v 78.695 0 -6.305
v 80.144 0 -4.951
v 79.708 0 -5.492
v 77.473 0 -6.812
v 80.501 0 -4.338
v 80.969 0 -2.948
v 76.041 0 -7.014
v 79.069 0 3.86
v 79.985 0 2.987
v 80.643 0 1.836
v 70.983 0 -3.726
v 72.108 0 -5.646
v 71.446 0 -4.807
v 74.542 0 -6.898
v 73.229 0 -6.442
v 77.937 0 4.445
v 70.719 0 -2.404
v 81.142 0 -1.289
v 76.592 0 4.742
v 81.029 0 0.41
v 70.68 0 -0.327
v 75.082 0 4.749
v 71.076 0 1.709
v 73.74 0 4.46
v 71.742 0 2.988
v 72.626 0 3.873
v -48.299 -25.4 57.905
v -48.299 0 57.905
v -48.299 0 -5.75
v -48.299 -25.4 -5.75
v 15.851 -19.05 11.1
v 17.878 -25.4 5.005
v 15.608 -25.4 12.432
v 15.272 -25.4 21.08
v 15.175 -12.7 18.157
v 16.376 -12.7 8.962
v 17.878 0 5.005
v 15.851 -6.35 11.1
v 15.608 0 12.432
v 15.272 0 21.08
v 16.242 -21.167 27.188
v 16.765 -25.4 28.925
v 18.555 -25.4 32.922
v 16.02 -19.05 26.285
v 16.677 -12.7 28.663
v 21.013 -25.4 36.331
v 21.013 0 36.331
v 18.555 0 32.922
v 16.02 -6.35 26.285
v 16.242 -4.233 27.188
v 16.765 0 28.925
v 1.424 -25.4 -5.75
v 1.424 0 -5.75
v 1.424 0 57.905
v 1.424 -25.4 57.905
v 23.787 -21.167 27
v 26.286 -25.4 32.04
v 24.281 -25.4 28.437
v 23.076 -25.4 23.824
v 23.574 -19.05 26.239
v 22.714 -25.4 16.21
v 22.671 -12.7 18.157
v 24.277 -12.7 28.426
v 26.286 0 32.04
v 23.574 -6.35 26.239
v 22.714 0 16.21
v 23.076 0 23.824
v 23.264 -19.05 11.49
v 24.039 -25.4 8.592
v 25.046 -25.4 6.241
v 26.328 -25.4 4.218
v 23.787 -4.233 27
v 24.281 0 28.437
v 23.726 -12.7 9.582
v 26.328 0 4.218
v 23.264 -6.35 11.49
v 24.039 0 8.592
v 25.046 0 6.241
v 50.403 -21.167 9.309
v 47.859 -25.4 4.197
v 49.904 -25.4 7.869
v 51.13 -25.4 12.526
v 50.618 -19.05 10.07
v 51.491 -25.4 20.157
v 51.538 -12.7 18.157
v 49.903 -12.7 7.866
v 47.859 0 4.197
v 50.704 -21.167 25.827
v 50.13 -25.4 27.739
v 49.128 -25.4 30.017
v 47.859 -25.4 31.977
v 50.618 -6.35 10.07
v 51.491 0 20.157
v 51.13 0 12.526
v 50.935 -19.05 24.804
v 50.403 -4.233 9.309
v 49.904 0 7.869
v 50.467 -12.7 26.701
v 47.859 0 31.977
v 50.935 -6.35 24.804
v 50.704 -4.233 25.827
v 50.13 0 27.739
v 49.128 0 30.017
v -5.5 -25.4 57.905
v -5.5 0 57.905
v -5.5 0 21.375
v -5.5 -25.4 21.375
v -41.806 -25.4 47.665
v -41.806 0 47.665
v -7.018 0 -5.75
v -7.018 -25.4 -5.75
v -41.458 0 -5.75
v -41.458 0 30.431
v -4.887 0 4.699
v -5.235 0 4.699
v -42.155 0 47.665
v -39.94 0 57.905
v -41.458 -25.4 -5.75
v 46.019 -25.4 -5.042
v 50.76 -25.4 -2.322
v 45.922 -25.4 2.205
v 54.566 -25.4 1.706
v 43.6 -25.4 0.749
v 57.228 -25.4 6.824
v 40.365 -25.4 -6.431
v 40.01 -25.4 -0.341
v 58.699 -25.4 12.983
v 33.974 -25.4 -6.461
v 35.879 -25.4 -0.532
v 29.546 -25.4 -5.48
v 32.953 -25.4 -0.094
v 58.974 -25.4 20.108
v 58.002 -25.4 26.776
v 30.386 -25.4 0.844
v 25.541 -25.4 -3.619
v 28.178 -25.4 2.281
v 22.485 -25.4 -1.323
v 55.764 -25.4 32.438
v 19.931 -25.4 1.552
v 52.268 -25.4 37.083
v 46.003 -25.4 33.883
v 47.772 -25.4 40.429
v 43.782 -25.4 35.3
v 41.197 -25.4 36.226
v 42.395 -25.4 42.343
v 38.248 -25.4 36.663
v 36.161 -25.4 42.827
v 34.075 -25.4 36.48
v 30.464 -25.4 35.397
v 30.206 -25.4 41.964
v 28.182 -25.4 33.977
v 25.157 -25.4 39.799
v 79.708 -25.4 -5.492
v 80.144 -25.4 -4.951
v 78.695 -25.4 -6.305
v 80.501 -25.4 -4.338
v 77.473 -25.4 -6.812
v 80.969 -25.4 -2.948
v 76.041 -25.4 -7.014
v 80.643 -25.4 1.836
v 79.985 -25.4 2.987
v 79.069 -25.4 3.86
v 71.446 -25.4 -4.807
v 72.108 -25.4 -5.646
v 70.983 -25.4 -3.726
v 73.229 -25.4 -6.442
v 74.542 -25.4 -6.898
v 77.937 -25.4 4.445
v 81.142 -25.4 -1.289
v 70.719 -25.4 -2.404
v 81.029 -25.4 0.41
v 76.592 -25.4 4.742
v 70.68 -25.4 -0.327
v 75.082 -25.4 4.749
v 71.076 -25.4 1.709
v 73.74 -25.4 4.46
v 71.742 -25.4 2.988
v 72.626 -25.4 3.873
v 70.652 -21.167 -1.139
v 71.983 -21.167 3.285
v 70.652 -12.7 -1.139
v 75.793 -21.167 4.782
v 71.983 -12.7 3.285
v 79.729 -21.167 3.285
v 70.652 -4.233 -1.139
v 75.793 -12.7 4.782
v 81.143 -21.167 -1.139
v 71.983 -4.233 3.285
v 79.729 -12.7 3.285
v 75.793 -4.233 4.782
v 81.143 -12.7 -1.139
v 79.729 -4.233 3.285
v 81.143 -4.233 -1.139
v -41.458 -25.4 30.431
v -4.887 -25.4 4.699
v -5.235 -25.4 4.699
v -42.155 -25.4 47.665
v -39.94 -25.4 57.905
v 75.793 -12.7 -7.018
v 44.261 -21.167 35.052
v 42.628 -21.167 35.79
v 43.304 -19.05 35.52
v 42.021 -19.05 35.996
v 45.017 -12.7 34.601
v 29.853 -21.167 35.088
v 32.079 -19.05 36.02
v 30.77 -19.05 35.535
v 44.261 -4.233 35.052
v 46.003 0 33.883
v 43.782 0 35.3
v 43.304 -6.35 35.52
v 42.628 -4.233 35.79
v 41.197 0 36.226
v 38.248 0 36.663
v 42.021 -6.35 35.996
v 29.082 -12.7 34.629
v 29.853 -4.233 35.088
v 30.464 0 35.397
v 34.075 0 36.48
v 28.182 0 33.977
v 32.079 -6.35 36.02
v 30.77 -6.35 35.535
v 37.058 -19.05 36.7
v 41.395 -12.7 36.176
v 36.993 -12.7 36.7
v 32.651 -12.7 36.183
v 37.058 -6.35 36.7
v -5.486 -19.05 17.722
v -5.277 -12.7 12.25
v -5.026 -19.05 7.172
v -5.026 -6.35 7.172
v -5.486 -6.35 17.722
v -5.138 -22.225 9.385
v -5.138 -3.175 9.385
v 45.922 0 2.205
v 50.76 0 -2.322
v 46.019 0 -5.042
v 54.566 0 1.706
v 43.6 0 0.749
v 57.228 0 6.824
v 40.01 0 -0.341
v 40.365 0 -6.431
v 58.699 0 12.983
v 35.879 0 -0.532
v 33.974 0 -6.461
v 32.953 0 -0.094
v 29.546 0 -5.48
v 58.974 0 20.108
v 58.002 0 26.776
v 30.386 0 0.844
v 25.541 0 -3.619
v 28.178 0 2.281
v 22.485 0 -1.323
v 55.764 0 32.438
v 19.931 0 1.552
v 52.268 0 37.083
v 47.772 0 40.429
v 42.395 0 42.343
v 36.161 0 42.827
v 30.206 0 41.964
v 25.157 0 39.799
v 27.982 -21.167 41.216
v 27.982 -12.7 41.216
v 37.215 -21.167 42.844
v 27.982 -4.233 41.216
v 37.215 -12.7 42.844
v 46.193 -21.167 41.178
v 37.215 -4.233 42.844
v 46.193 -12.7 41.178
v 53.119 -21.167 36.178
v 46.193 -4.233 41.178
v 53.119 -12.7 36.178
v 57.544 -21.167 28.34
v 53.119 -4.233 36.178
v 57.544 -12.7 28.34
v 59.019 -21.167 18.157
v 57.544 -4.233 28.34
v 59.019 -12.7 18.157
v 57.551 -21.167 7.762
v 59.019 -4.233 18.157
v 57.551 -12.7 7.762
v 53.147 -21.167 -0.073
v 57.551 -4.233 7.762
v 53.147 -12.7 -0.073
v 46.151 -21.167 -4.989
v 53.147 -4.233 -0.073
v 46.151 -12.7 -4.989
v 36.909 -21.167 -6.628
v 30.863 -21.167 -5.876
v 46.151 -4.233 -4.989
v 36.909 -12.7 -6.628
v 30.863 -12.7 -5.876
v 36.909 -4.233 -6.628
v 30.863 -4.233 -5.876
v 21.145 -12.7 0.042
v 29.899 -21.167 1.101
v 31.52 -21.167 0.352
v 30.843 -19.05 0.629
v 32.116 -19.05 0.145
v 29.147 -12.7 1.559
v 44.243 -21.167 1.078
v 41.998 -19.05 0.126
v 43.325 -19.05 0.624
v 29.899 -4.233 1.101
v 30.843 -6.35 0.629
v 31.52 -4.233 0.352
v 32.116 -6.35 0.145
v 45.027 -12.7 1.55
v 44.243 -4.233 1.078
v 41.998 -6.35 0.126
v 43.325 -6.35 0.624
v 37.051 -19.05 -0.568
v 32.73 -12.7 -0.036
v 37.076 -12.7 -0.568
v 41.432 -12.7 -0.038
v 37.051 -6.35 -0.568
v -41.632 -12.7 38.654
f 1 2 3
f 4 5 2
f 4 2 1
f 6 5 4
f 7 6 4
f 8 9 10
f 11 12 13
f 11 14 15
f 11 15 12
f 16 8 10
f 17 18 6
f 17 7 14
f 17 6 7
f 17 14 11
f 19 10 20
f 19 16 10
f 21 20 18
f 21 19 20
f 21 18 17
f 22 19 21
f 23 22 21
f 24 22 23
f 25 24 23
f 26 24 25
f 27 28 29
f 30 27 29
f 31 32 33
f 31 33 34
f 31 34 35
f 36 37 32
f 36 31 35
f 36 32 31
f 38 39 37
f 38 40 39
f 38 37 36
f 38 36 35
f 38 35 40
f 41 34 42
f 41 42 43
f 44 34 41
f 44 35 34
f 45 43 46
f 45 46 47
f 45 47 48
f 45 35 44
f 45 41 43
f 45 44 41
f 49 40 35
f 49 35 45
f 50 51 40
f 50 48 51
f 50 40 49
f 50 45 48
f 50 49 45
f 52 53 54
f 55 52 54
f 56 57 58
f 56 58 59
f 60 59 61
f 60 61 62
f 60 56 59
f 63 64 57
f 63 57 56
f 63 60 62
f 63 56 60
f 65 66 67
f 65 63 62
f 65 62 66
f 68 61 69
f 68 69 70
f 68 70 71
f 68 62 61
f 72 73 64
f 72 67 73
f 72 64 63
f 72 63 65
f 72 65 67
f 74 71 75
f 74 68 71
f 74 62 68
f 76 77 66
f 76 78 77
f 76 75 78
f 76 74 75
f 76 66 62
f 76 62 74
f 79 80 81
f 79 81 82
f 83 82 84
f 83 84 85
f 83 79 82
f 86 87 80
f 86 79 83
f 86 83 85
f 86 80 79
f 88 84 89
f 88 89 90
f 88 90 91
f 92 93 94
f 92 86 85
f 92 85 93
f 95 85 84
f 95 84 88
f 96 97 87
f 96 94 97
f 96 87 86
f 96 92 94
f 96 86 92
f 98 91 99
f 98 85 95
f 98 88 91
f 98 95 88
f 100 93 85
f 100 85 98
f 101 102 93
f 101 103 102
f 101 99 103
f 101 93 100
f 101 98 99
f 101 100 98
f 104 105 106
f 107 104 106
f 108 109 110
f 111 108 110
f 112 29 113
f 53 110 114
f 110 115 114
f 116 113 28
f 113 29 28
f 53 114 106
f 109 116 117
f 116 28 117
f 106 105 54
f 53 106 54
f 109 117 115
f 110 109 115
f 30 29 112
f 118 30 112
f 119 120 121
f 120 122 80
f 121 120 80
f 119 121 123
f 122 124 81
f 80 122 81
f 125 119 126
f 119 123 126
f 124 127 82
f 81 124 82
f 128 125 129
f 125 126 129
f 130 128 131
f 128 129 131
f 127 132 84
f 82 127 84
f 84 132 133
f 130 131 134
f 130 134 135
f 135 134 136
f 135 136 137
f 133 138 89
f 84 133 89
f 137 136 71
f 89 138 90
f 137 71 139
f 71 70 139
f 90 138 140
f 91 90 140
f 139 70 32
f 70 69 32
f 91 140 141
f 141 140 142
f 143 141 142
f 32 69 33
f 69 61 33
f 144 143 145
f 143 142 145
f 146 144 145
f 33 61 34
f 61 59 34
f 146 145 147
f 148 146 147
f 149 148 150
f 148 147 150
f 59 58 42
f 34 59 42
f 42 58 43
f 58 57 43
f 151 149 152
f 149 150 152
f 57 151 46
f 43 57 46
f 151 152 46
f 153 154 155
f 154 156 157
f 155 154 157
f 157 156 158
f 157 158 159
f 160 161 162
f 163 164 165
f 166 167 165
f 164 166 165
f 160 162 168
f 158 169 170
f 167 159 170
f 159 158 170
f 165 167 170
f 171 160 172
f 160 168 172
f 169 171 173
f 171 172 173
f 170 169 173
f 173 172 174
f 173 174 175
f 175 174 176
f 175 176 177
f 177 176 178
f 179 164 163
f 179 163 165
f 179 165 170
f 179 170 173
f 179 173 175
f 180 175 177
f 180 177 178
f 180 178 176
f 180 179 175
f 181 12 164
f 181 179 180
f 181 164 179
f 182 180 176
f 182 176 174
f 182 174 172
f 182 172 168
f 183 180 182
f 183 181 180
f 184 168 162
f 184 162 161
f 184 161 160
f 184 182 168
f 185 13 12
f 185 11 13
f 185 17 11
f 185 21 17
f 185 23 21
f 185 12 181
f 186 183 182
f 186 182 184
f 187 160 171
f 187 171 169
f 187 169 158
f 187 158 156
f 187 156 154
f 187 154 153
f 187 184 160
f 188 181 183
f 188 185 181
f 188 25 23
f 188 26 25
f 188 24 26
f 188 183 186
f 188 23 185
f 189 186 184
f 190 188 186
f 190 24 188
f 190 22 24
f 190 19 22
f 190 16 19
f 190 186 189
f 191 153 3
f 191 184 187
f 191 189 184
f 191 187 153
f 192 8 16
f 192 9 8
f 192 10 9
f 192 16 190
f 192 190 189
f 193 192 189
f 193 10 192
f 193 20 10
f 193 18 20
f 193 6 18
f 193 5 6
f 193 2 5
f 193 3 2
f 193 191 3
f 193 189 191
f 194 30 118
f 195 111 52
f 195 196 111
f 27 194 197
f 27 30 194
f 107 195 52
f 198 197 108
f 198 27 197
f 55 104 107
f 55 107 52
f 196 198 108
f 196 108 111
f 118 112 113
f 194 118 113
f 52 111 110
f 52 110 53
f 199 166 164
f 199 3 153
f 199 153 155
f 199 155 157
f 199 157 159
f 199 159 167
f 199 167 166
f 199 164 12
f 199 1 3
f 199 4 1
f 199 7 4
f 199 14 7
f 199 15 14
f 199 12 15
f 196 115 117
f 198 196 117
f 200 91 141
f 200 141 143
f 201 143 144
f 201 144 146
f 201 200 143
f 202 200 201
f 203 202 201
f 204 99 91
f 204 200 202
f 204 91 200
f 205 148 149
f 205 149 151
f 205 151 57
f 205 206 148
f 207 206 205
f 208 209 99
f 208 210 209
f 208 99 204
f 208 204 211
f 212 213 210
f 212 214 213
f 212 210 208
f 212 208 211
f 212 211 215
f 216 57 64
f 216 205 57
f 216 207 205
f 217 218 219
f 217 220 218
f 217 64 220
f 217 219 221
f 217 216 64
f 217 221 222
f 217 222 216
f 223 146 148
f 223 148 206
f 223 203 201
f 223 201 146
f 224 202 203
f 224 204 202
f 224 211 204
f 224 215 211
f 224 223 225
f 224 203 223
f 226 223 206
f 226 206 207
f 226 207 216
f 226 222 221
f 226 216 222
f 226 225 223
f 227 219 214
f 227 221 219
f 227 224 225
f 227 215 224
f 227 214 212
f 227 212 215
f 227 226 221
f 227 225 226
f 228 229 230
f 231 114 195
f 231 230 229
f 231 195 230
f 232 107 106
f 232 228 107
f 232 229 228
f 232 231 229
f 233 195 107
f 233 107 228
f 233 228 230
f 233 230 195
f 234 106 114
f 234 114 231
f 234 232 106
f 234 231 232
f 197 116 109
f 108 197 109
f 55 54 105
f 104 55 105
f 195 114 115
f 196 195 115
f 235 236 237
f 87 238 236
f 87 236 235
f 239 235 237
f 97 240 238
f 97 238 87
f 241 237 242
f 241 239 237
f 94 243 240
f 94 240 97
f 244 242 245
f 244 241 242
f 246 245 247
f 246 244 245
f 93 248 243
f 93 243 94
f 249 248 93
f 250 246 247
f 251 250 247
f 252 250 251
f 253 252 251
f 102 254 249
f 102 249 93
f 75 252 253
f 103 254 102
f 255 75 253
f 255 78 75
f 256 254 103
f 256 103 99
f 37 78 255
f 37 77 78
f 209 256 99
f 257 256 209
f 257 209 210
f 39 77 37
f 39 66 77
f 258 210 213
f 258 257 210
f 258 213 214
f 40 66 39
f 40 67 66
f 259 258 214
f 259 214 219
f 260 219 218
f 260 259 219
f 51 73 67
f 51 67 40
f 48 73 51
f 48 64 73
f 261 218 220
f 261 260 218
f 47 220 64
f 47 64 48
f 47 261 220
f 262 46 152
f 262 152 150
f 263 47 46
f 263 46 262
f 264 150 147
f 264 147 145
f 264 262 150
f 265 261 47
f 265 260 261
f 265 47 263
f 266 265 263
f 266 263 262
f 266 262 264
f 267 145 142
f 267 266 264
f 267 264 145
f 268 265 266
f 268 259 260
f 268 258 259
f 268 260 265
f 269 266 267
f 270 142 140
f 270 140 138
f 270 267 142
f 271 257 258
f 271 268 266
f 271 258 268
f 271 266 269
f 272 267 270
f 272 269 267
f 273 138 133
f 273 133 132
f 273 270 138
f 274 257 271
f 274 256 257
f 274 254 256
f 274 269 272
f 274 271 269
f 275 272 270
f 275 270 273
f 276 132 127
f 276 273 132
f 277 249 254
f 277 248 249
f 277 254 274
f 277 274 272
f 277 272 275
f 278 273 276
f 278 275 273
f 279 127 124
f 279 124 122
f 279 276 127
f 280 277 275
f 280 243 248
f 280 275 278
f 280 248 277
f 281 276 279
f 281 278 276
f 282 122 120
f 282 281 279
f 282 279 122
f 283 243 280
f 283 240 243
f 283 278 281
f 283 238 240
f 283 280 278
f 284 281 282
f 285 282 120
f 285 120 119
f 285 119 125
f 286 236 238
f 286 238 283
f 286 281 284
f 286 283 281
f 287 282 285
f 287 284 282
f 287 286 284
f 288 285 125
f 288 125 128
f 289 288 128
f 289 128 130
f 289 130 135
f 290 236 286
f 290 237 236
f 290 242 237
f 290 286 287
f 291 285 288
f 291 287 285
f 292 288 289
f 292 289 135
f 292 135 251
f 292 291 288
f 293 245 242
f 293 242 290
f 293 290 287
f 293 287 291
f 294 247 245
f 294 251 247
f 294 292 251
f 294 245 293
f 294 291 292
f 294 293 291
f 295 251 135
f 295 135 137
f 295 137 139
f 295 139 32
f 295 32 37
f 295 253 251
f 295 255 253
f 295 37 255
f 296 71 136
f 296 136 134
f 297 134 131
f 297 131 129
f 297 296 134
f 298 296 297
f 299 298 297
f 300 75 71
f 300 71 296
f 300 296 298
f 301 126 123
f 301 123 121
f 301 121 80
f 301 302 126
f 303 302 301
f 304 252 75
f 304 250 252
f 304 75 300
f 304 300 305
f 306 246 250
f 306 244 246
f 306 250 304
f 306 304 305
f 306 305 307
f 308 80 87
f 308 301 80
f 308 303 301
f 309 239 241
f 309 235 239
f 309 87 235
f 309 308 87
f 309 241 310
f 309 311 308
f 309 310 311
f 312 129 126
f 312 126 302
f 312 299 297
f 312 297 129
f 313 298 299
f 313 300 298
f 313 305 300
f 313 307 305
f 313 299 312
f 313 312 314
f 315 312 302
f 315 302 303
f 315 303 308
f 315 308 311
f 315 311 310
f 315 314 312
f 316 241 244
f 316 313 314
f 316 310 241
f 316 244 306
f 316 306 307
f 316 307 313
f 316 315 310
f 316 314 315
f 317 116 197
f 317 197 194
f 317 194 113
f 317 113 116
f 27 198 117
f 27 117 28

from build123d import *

# Parameters (mm, degrees)
F1_DEPTH = 25.4
F2_DEPTH = 25.4
F3_DEPTH = 25.4


with BuildPart() as f1:
    # F0 (on Front) → F1 (new body)
    with BuildSketch(Plane.XZ):
        with BuildLine():
            add(Edge.make_bspline(
                [(59.0189850758, 18.1570056169), (59.0189850758, 6.4820364458), (53.1466706299, -0.0729432619)],
                knots=[0, 0, 0, 1, 1, 1], degree=2))
            add(Edge.make_bspline(
                [(53.1188067417, 36.1779753338), (59.0189850758, 29.5115400732), (59.0189850758, 18.1570056169)],
                knots=[0, 0, 0, 1, 1, 1], degree=2))
            add(Edge.make_bspline(
                [(37.2154925307, 42.8444105944), (47.2186284076, 42.8444105944), (53.1188067417, 36.1779753338)],
                knots=[0, 0, 0, 1, 1, 1], degree=2))
            add(Edge.make_bspline(
                [(21.0126415211, 36.3312267191), (26.8501261067, 42.8444105944), (37.2154925307, 42.8444105944)],
                knots=[0, 0, 0, 1, 1, 1], degree=2))
            add(Edge.make_bspline(
                [(15.1751569356, 18.1570056169), (15.1751569356, 29.8180428438), (21.0126415211, 36.3312267191)],
                knots=[0, 0, 0, 1, 1, 1], degree=2))
            add(Edge.make_bspline(
                [(17.8779540945, 5.0052503692), (15.1751569356, 10.6198238489), (15.1751569356, 18.1570056169)],
                knots=[0, 0, 0, 1, 1, 1], degree=2))
            add(Edge.make_bspline(
                [(25.5405233596, -3.61862304), (20.5807512535, -0.6093231104), (17.8779540945, 5.0052503692)],
                knots=[0, 0, 0, 1, 1, 1], degree=2))
            add(Edge.make_bspline(
                [(36.9089897601, -6.6279229695), (30.5002954657, -6.6279229695), (25.5405233596, -3.61862304)],
                knots=[0, 0, 0, 1, 1, 1], degree=2))
            add(Edge.make_bspline(
                [(53.1466706299, -0.0729432619), (47.2743561841, -6.6279229695), (36.9089897601, -6.6279229695)],
                knots=[0, 0, 0, 1, 1, 1], degree=2))
        make_face()
        with BuildLine():
            add(Edge.make_bspline(
                [(22.6705428712, 18.1570056169), (22.6705428712, 9.0037183312), (26.3276782023, 4.2180955265)],
                knots=[0, 0, 0, 1, 1, 1], degree=2))
            add(Edge.make_bspline(
                [(26.2858823699, 32.0401879307), (22.6705428712, 27.3799526232), (22.6705428712, 18.1570056169)],
                knots=[0, 0, 0, 1, 1, 1], degree=2))
            add(Edge.make_bspline(
                [(36.9925814248, 36.7004232383), (29.9012218686, 36.7004232383), (26.2858823699, 32.0401879307)],
                knots=[0, 0, 0, 1, 1, 1], degree=2))
            add(Edge.make_bspline(
                [(47.859497837, 31.9774941822), (44.1814645898, 36.7004232383), (36.9925814248, 36.7004232383)],
                knots=[0, 0, 0, 1, 1, 1], degree=2))
            add(Edge.make_bspline(
                [(51.5375310843, 18.1570056169), (51.5375310843, 27.2545651261), (47.859497837, 31.9774941822)],
                knots=[0, 0, 0, 1, 1, 1], degree=2))
            add(Edge.make_bspline(
                [(47.859497837, 4.1971976104), (51.5375310843, 8.9619224988), (51.5375310843, 18.1570056169)],
                knots=[0, 0, 0, 1, 1, 1], degree=2))
            add(Edge.make_bspline(
                [(37.0761730895, -0.5675272781), (44.1814645898, -0.5675272781), (47.859497837, 4.1971976104)],
                knots=[0, 0, 0, 1, 1, 1], degree=2))
            add(Edge.make_bspline(
                [(26.3276782023, 4.2180955265), (29.9848135333, -0.5675272781), (37.0761730895, -0.5675272781)],
                knots=[0, 0, 0, 1, 1, 1], degree=2))
        make_face(mode=Mode.SUBTRACT)
    extrude(amount=F1_DEPTH)


with BuildPart() as f2:
    # F0 (on Front) → F2 (new body)
    with BuildSketch(Plane.XZ):
        with BuildLine():
            Line((-7.0184300448, -5.7502104901), (1.4243280909, -5.7502104901))
            Line((1.4243280909, -5.7502104901), (1.4243280909, 57.9048421863))
            Line((1.4243280909, 57.9048421863), (-5.4998481359, 57.9048421863))
            Line((-5.4998481359, 57.9048421863), (-5.4998481359, 21.3752847082))
            add(Edge.make_bspline(
                [(-5.27693703, 12.2498613107), (-5.5834398006, 18.6306917169), (-5.4998481359, 21.3752847082)],
                knots=[0, 0, 0, 1, 1, 1], degree=2))
            add(Edge.make_bspline(
                [(-4.8868425947, 4.6987475986), (-4.9704342594, 5.8690309046), (-5.27693703, 12.2498613107)],
                knots=[0, 0, 0, 1, 1, 1], degree=2))
            Line((-4.8868425947, 4.6987475986), (-5.2351411977, 4.6987475986))
            Line((-5.2351411977, 4.6987475986), (-39.9396139963, 57.9048421863))
            Line((-39.9396139963, 57.9048421863), (-48.2987804672, 57.9048421863))
            Line((-48.2987804672, 57.9048421863), (-48.2987804672, -5.7502104901))
            Line((-48.2987804672, -5.7502104901), (-41.4581959052, -5.7502104901))
            Line((-41.4581959052, -5.7502104901), (-41.4581959052, 30.4310483851))
            add(Edge.make_bspline(
                [(-42.1547931111, 47.6648632593), (-41.4581959052, 38.2608009795), (-41.4581959052, 30.4310483851)],
                knots=[0, 0, 0, 1, 1, 1], degree=2))
            Line((-42.1547931111, 47.6648632593), (-41.8064945081, 47.6648632593))
            Line((-41.8064945081, 47.6648632593), (-7.0184300448, -5.7502104901))
        make_face()
    extrude(amount=F2_DEPTH)


with BuildPart() as f3:
    # F0 (on Front) → F3 (new body)
    with BuildSketch(Plane.XZ):
        with BuildLine():
            add(Edge.make_bspline(
                [(70.6521584145, -1.1387369869), (70.6521584145, 1.7869712779), (71.9826590778, 3.2846552706)],
                knots=[0, 0, 0, 1, 1, 1], degree=2))
            add(Edge.make_bspline(
                [(72.1080465749, -5.6457209092), (70.6521584145, -4.2734244135), (70.6521584145, -1.1387369869)],
                knots=[0, 0, 0, 1, 1, 1], degree=2))
            add(Edge.make_bspline(
                [(75.7930457941, -7.0180174048), (73.5639347352, -7.0180174048), (72.1080465749, -5.6457209092)],
                knots=[0, 0, 0, 1, 1, 1], degree=2))
            add(Edge.make_bspline(
                [(79.7079220914, -5.4924695239), (78.2729318472, -7.0180174048), (75.7930457941, -7.0180174048)],
                knots=[0, 0, 0, 1, 1, 1], degree=2))
            add(Edge.make_bspline(
                [(81.1429123356, -1.1387369869), (81.1429123356, -3.9669216429), (79.7079220914, -5.4924695239)],
                knots=[0, 0, 0, 1, 1, 1], degree=2))
            add(Edge.make_bspline(
                [(79.7288200076, 3.2846552706), (81.1429123356, 1.7869712779), (81.1429123356, -1.1387369869)],
                knots=[0, 0, 0, 1, 1, 1], degree=2))
            add(Edge.make_bspline(
                [(75.7930457941, 4.7823392633), (78.3147276796, 4.7823392633), (79.7288200076, 3.2846552706)],
                knots=[0, 0, 0, 1, 1, 1], degree=2))
            add(Edge.make_bspline(
                [(71.9826590778, 3.2846552706), (73.3131597411, 4.7823392633), (75.7930457941, 4.7823392633)],
                knots=[0, 0, 0, 1, 1, 1], degree=2))
        make_face()
    extrude(amount=F3_DEPTH)


solid = Compound([f1.part, f2.part, f3.part])
